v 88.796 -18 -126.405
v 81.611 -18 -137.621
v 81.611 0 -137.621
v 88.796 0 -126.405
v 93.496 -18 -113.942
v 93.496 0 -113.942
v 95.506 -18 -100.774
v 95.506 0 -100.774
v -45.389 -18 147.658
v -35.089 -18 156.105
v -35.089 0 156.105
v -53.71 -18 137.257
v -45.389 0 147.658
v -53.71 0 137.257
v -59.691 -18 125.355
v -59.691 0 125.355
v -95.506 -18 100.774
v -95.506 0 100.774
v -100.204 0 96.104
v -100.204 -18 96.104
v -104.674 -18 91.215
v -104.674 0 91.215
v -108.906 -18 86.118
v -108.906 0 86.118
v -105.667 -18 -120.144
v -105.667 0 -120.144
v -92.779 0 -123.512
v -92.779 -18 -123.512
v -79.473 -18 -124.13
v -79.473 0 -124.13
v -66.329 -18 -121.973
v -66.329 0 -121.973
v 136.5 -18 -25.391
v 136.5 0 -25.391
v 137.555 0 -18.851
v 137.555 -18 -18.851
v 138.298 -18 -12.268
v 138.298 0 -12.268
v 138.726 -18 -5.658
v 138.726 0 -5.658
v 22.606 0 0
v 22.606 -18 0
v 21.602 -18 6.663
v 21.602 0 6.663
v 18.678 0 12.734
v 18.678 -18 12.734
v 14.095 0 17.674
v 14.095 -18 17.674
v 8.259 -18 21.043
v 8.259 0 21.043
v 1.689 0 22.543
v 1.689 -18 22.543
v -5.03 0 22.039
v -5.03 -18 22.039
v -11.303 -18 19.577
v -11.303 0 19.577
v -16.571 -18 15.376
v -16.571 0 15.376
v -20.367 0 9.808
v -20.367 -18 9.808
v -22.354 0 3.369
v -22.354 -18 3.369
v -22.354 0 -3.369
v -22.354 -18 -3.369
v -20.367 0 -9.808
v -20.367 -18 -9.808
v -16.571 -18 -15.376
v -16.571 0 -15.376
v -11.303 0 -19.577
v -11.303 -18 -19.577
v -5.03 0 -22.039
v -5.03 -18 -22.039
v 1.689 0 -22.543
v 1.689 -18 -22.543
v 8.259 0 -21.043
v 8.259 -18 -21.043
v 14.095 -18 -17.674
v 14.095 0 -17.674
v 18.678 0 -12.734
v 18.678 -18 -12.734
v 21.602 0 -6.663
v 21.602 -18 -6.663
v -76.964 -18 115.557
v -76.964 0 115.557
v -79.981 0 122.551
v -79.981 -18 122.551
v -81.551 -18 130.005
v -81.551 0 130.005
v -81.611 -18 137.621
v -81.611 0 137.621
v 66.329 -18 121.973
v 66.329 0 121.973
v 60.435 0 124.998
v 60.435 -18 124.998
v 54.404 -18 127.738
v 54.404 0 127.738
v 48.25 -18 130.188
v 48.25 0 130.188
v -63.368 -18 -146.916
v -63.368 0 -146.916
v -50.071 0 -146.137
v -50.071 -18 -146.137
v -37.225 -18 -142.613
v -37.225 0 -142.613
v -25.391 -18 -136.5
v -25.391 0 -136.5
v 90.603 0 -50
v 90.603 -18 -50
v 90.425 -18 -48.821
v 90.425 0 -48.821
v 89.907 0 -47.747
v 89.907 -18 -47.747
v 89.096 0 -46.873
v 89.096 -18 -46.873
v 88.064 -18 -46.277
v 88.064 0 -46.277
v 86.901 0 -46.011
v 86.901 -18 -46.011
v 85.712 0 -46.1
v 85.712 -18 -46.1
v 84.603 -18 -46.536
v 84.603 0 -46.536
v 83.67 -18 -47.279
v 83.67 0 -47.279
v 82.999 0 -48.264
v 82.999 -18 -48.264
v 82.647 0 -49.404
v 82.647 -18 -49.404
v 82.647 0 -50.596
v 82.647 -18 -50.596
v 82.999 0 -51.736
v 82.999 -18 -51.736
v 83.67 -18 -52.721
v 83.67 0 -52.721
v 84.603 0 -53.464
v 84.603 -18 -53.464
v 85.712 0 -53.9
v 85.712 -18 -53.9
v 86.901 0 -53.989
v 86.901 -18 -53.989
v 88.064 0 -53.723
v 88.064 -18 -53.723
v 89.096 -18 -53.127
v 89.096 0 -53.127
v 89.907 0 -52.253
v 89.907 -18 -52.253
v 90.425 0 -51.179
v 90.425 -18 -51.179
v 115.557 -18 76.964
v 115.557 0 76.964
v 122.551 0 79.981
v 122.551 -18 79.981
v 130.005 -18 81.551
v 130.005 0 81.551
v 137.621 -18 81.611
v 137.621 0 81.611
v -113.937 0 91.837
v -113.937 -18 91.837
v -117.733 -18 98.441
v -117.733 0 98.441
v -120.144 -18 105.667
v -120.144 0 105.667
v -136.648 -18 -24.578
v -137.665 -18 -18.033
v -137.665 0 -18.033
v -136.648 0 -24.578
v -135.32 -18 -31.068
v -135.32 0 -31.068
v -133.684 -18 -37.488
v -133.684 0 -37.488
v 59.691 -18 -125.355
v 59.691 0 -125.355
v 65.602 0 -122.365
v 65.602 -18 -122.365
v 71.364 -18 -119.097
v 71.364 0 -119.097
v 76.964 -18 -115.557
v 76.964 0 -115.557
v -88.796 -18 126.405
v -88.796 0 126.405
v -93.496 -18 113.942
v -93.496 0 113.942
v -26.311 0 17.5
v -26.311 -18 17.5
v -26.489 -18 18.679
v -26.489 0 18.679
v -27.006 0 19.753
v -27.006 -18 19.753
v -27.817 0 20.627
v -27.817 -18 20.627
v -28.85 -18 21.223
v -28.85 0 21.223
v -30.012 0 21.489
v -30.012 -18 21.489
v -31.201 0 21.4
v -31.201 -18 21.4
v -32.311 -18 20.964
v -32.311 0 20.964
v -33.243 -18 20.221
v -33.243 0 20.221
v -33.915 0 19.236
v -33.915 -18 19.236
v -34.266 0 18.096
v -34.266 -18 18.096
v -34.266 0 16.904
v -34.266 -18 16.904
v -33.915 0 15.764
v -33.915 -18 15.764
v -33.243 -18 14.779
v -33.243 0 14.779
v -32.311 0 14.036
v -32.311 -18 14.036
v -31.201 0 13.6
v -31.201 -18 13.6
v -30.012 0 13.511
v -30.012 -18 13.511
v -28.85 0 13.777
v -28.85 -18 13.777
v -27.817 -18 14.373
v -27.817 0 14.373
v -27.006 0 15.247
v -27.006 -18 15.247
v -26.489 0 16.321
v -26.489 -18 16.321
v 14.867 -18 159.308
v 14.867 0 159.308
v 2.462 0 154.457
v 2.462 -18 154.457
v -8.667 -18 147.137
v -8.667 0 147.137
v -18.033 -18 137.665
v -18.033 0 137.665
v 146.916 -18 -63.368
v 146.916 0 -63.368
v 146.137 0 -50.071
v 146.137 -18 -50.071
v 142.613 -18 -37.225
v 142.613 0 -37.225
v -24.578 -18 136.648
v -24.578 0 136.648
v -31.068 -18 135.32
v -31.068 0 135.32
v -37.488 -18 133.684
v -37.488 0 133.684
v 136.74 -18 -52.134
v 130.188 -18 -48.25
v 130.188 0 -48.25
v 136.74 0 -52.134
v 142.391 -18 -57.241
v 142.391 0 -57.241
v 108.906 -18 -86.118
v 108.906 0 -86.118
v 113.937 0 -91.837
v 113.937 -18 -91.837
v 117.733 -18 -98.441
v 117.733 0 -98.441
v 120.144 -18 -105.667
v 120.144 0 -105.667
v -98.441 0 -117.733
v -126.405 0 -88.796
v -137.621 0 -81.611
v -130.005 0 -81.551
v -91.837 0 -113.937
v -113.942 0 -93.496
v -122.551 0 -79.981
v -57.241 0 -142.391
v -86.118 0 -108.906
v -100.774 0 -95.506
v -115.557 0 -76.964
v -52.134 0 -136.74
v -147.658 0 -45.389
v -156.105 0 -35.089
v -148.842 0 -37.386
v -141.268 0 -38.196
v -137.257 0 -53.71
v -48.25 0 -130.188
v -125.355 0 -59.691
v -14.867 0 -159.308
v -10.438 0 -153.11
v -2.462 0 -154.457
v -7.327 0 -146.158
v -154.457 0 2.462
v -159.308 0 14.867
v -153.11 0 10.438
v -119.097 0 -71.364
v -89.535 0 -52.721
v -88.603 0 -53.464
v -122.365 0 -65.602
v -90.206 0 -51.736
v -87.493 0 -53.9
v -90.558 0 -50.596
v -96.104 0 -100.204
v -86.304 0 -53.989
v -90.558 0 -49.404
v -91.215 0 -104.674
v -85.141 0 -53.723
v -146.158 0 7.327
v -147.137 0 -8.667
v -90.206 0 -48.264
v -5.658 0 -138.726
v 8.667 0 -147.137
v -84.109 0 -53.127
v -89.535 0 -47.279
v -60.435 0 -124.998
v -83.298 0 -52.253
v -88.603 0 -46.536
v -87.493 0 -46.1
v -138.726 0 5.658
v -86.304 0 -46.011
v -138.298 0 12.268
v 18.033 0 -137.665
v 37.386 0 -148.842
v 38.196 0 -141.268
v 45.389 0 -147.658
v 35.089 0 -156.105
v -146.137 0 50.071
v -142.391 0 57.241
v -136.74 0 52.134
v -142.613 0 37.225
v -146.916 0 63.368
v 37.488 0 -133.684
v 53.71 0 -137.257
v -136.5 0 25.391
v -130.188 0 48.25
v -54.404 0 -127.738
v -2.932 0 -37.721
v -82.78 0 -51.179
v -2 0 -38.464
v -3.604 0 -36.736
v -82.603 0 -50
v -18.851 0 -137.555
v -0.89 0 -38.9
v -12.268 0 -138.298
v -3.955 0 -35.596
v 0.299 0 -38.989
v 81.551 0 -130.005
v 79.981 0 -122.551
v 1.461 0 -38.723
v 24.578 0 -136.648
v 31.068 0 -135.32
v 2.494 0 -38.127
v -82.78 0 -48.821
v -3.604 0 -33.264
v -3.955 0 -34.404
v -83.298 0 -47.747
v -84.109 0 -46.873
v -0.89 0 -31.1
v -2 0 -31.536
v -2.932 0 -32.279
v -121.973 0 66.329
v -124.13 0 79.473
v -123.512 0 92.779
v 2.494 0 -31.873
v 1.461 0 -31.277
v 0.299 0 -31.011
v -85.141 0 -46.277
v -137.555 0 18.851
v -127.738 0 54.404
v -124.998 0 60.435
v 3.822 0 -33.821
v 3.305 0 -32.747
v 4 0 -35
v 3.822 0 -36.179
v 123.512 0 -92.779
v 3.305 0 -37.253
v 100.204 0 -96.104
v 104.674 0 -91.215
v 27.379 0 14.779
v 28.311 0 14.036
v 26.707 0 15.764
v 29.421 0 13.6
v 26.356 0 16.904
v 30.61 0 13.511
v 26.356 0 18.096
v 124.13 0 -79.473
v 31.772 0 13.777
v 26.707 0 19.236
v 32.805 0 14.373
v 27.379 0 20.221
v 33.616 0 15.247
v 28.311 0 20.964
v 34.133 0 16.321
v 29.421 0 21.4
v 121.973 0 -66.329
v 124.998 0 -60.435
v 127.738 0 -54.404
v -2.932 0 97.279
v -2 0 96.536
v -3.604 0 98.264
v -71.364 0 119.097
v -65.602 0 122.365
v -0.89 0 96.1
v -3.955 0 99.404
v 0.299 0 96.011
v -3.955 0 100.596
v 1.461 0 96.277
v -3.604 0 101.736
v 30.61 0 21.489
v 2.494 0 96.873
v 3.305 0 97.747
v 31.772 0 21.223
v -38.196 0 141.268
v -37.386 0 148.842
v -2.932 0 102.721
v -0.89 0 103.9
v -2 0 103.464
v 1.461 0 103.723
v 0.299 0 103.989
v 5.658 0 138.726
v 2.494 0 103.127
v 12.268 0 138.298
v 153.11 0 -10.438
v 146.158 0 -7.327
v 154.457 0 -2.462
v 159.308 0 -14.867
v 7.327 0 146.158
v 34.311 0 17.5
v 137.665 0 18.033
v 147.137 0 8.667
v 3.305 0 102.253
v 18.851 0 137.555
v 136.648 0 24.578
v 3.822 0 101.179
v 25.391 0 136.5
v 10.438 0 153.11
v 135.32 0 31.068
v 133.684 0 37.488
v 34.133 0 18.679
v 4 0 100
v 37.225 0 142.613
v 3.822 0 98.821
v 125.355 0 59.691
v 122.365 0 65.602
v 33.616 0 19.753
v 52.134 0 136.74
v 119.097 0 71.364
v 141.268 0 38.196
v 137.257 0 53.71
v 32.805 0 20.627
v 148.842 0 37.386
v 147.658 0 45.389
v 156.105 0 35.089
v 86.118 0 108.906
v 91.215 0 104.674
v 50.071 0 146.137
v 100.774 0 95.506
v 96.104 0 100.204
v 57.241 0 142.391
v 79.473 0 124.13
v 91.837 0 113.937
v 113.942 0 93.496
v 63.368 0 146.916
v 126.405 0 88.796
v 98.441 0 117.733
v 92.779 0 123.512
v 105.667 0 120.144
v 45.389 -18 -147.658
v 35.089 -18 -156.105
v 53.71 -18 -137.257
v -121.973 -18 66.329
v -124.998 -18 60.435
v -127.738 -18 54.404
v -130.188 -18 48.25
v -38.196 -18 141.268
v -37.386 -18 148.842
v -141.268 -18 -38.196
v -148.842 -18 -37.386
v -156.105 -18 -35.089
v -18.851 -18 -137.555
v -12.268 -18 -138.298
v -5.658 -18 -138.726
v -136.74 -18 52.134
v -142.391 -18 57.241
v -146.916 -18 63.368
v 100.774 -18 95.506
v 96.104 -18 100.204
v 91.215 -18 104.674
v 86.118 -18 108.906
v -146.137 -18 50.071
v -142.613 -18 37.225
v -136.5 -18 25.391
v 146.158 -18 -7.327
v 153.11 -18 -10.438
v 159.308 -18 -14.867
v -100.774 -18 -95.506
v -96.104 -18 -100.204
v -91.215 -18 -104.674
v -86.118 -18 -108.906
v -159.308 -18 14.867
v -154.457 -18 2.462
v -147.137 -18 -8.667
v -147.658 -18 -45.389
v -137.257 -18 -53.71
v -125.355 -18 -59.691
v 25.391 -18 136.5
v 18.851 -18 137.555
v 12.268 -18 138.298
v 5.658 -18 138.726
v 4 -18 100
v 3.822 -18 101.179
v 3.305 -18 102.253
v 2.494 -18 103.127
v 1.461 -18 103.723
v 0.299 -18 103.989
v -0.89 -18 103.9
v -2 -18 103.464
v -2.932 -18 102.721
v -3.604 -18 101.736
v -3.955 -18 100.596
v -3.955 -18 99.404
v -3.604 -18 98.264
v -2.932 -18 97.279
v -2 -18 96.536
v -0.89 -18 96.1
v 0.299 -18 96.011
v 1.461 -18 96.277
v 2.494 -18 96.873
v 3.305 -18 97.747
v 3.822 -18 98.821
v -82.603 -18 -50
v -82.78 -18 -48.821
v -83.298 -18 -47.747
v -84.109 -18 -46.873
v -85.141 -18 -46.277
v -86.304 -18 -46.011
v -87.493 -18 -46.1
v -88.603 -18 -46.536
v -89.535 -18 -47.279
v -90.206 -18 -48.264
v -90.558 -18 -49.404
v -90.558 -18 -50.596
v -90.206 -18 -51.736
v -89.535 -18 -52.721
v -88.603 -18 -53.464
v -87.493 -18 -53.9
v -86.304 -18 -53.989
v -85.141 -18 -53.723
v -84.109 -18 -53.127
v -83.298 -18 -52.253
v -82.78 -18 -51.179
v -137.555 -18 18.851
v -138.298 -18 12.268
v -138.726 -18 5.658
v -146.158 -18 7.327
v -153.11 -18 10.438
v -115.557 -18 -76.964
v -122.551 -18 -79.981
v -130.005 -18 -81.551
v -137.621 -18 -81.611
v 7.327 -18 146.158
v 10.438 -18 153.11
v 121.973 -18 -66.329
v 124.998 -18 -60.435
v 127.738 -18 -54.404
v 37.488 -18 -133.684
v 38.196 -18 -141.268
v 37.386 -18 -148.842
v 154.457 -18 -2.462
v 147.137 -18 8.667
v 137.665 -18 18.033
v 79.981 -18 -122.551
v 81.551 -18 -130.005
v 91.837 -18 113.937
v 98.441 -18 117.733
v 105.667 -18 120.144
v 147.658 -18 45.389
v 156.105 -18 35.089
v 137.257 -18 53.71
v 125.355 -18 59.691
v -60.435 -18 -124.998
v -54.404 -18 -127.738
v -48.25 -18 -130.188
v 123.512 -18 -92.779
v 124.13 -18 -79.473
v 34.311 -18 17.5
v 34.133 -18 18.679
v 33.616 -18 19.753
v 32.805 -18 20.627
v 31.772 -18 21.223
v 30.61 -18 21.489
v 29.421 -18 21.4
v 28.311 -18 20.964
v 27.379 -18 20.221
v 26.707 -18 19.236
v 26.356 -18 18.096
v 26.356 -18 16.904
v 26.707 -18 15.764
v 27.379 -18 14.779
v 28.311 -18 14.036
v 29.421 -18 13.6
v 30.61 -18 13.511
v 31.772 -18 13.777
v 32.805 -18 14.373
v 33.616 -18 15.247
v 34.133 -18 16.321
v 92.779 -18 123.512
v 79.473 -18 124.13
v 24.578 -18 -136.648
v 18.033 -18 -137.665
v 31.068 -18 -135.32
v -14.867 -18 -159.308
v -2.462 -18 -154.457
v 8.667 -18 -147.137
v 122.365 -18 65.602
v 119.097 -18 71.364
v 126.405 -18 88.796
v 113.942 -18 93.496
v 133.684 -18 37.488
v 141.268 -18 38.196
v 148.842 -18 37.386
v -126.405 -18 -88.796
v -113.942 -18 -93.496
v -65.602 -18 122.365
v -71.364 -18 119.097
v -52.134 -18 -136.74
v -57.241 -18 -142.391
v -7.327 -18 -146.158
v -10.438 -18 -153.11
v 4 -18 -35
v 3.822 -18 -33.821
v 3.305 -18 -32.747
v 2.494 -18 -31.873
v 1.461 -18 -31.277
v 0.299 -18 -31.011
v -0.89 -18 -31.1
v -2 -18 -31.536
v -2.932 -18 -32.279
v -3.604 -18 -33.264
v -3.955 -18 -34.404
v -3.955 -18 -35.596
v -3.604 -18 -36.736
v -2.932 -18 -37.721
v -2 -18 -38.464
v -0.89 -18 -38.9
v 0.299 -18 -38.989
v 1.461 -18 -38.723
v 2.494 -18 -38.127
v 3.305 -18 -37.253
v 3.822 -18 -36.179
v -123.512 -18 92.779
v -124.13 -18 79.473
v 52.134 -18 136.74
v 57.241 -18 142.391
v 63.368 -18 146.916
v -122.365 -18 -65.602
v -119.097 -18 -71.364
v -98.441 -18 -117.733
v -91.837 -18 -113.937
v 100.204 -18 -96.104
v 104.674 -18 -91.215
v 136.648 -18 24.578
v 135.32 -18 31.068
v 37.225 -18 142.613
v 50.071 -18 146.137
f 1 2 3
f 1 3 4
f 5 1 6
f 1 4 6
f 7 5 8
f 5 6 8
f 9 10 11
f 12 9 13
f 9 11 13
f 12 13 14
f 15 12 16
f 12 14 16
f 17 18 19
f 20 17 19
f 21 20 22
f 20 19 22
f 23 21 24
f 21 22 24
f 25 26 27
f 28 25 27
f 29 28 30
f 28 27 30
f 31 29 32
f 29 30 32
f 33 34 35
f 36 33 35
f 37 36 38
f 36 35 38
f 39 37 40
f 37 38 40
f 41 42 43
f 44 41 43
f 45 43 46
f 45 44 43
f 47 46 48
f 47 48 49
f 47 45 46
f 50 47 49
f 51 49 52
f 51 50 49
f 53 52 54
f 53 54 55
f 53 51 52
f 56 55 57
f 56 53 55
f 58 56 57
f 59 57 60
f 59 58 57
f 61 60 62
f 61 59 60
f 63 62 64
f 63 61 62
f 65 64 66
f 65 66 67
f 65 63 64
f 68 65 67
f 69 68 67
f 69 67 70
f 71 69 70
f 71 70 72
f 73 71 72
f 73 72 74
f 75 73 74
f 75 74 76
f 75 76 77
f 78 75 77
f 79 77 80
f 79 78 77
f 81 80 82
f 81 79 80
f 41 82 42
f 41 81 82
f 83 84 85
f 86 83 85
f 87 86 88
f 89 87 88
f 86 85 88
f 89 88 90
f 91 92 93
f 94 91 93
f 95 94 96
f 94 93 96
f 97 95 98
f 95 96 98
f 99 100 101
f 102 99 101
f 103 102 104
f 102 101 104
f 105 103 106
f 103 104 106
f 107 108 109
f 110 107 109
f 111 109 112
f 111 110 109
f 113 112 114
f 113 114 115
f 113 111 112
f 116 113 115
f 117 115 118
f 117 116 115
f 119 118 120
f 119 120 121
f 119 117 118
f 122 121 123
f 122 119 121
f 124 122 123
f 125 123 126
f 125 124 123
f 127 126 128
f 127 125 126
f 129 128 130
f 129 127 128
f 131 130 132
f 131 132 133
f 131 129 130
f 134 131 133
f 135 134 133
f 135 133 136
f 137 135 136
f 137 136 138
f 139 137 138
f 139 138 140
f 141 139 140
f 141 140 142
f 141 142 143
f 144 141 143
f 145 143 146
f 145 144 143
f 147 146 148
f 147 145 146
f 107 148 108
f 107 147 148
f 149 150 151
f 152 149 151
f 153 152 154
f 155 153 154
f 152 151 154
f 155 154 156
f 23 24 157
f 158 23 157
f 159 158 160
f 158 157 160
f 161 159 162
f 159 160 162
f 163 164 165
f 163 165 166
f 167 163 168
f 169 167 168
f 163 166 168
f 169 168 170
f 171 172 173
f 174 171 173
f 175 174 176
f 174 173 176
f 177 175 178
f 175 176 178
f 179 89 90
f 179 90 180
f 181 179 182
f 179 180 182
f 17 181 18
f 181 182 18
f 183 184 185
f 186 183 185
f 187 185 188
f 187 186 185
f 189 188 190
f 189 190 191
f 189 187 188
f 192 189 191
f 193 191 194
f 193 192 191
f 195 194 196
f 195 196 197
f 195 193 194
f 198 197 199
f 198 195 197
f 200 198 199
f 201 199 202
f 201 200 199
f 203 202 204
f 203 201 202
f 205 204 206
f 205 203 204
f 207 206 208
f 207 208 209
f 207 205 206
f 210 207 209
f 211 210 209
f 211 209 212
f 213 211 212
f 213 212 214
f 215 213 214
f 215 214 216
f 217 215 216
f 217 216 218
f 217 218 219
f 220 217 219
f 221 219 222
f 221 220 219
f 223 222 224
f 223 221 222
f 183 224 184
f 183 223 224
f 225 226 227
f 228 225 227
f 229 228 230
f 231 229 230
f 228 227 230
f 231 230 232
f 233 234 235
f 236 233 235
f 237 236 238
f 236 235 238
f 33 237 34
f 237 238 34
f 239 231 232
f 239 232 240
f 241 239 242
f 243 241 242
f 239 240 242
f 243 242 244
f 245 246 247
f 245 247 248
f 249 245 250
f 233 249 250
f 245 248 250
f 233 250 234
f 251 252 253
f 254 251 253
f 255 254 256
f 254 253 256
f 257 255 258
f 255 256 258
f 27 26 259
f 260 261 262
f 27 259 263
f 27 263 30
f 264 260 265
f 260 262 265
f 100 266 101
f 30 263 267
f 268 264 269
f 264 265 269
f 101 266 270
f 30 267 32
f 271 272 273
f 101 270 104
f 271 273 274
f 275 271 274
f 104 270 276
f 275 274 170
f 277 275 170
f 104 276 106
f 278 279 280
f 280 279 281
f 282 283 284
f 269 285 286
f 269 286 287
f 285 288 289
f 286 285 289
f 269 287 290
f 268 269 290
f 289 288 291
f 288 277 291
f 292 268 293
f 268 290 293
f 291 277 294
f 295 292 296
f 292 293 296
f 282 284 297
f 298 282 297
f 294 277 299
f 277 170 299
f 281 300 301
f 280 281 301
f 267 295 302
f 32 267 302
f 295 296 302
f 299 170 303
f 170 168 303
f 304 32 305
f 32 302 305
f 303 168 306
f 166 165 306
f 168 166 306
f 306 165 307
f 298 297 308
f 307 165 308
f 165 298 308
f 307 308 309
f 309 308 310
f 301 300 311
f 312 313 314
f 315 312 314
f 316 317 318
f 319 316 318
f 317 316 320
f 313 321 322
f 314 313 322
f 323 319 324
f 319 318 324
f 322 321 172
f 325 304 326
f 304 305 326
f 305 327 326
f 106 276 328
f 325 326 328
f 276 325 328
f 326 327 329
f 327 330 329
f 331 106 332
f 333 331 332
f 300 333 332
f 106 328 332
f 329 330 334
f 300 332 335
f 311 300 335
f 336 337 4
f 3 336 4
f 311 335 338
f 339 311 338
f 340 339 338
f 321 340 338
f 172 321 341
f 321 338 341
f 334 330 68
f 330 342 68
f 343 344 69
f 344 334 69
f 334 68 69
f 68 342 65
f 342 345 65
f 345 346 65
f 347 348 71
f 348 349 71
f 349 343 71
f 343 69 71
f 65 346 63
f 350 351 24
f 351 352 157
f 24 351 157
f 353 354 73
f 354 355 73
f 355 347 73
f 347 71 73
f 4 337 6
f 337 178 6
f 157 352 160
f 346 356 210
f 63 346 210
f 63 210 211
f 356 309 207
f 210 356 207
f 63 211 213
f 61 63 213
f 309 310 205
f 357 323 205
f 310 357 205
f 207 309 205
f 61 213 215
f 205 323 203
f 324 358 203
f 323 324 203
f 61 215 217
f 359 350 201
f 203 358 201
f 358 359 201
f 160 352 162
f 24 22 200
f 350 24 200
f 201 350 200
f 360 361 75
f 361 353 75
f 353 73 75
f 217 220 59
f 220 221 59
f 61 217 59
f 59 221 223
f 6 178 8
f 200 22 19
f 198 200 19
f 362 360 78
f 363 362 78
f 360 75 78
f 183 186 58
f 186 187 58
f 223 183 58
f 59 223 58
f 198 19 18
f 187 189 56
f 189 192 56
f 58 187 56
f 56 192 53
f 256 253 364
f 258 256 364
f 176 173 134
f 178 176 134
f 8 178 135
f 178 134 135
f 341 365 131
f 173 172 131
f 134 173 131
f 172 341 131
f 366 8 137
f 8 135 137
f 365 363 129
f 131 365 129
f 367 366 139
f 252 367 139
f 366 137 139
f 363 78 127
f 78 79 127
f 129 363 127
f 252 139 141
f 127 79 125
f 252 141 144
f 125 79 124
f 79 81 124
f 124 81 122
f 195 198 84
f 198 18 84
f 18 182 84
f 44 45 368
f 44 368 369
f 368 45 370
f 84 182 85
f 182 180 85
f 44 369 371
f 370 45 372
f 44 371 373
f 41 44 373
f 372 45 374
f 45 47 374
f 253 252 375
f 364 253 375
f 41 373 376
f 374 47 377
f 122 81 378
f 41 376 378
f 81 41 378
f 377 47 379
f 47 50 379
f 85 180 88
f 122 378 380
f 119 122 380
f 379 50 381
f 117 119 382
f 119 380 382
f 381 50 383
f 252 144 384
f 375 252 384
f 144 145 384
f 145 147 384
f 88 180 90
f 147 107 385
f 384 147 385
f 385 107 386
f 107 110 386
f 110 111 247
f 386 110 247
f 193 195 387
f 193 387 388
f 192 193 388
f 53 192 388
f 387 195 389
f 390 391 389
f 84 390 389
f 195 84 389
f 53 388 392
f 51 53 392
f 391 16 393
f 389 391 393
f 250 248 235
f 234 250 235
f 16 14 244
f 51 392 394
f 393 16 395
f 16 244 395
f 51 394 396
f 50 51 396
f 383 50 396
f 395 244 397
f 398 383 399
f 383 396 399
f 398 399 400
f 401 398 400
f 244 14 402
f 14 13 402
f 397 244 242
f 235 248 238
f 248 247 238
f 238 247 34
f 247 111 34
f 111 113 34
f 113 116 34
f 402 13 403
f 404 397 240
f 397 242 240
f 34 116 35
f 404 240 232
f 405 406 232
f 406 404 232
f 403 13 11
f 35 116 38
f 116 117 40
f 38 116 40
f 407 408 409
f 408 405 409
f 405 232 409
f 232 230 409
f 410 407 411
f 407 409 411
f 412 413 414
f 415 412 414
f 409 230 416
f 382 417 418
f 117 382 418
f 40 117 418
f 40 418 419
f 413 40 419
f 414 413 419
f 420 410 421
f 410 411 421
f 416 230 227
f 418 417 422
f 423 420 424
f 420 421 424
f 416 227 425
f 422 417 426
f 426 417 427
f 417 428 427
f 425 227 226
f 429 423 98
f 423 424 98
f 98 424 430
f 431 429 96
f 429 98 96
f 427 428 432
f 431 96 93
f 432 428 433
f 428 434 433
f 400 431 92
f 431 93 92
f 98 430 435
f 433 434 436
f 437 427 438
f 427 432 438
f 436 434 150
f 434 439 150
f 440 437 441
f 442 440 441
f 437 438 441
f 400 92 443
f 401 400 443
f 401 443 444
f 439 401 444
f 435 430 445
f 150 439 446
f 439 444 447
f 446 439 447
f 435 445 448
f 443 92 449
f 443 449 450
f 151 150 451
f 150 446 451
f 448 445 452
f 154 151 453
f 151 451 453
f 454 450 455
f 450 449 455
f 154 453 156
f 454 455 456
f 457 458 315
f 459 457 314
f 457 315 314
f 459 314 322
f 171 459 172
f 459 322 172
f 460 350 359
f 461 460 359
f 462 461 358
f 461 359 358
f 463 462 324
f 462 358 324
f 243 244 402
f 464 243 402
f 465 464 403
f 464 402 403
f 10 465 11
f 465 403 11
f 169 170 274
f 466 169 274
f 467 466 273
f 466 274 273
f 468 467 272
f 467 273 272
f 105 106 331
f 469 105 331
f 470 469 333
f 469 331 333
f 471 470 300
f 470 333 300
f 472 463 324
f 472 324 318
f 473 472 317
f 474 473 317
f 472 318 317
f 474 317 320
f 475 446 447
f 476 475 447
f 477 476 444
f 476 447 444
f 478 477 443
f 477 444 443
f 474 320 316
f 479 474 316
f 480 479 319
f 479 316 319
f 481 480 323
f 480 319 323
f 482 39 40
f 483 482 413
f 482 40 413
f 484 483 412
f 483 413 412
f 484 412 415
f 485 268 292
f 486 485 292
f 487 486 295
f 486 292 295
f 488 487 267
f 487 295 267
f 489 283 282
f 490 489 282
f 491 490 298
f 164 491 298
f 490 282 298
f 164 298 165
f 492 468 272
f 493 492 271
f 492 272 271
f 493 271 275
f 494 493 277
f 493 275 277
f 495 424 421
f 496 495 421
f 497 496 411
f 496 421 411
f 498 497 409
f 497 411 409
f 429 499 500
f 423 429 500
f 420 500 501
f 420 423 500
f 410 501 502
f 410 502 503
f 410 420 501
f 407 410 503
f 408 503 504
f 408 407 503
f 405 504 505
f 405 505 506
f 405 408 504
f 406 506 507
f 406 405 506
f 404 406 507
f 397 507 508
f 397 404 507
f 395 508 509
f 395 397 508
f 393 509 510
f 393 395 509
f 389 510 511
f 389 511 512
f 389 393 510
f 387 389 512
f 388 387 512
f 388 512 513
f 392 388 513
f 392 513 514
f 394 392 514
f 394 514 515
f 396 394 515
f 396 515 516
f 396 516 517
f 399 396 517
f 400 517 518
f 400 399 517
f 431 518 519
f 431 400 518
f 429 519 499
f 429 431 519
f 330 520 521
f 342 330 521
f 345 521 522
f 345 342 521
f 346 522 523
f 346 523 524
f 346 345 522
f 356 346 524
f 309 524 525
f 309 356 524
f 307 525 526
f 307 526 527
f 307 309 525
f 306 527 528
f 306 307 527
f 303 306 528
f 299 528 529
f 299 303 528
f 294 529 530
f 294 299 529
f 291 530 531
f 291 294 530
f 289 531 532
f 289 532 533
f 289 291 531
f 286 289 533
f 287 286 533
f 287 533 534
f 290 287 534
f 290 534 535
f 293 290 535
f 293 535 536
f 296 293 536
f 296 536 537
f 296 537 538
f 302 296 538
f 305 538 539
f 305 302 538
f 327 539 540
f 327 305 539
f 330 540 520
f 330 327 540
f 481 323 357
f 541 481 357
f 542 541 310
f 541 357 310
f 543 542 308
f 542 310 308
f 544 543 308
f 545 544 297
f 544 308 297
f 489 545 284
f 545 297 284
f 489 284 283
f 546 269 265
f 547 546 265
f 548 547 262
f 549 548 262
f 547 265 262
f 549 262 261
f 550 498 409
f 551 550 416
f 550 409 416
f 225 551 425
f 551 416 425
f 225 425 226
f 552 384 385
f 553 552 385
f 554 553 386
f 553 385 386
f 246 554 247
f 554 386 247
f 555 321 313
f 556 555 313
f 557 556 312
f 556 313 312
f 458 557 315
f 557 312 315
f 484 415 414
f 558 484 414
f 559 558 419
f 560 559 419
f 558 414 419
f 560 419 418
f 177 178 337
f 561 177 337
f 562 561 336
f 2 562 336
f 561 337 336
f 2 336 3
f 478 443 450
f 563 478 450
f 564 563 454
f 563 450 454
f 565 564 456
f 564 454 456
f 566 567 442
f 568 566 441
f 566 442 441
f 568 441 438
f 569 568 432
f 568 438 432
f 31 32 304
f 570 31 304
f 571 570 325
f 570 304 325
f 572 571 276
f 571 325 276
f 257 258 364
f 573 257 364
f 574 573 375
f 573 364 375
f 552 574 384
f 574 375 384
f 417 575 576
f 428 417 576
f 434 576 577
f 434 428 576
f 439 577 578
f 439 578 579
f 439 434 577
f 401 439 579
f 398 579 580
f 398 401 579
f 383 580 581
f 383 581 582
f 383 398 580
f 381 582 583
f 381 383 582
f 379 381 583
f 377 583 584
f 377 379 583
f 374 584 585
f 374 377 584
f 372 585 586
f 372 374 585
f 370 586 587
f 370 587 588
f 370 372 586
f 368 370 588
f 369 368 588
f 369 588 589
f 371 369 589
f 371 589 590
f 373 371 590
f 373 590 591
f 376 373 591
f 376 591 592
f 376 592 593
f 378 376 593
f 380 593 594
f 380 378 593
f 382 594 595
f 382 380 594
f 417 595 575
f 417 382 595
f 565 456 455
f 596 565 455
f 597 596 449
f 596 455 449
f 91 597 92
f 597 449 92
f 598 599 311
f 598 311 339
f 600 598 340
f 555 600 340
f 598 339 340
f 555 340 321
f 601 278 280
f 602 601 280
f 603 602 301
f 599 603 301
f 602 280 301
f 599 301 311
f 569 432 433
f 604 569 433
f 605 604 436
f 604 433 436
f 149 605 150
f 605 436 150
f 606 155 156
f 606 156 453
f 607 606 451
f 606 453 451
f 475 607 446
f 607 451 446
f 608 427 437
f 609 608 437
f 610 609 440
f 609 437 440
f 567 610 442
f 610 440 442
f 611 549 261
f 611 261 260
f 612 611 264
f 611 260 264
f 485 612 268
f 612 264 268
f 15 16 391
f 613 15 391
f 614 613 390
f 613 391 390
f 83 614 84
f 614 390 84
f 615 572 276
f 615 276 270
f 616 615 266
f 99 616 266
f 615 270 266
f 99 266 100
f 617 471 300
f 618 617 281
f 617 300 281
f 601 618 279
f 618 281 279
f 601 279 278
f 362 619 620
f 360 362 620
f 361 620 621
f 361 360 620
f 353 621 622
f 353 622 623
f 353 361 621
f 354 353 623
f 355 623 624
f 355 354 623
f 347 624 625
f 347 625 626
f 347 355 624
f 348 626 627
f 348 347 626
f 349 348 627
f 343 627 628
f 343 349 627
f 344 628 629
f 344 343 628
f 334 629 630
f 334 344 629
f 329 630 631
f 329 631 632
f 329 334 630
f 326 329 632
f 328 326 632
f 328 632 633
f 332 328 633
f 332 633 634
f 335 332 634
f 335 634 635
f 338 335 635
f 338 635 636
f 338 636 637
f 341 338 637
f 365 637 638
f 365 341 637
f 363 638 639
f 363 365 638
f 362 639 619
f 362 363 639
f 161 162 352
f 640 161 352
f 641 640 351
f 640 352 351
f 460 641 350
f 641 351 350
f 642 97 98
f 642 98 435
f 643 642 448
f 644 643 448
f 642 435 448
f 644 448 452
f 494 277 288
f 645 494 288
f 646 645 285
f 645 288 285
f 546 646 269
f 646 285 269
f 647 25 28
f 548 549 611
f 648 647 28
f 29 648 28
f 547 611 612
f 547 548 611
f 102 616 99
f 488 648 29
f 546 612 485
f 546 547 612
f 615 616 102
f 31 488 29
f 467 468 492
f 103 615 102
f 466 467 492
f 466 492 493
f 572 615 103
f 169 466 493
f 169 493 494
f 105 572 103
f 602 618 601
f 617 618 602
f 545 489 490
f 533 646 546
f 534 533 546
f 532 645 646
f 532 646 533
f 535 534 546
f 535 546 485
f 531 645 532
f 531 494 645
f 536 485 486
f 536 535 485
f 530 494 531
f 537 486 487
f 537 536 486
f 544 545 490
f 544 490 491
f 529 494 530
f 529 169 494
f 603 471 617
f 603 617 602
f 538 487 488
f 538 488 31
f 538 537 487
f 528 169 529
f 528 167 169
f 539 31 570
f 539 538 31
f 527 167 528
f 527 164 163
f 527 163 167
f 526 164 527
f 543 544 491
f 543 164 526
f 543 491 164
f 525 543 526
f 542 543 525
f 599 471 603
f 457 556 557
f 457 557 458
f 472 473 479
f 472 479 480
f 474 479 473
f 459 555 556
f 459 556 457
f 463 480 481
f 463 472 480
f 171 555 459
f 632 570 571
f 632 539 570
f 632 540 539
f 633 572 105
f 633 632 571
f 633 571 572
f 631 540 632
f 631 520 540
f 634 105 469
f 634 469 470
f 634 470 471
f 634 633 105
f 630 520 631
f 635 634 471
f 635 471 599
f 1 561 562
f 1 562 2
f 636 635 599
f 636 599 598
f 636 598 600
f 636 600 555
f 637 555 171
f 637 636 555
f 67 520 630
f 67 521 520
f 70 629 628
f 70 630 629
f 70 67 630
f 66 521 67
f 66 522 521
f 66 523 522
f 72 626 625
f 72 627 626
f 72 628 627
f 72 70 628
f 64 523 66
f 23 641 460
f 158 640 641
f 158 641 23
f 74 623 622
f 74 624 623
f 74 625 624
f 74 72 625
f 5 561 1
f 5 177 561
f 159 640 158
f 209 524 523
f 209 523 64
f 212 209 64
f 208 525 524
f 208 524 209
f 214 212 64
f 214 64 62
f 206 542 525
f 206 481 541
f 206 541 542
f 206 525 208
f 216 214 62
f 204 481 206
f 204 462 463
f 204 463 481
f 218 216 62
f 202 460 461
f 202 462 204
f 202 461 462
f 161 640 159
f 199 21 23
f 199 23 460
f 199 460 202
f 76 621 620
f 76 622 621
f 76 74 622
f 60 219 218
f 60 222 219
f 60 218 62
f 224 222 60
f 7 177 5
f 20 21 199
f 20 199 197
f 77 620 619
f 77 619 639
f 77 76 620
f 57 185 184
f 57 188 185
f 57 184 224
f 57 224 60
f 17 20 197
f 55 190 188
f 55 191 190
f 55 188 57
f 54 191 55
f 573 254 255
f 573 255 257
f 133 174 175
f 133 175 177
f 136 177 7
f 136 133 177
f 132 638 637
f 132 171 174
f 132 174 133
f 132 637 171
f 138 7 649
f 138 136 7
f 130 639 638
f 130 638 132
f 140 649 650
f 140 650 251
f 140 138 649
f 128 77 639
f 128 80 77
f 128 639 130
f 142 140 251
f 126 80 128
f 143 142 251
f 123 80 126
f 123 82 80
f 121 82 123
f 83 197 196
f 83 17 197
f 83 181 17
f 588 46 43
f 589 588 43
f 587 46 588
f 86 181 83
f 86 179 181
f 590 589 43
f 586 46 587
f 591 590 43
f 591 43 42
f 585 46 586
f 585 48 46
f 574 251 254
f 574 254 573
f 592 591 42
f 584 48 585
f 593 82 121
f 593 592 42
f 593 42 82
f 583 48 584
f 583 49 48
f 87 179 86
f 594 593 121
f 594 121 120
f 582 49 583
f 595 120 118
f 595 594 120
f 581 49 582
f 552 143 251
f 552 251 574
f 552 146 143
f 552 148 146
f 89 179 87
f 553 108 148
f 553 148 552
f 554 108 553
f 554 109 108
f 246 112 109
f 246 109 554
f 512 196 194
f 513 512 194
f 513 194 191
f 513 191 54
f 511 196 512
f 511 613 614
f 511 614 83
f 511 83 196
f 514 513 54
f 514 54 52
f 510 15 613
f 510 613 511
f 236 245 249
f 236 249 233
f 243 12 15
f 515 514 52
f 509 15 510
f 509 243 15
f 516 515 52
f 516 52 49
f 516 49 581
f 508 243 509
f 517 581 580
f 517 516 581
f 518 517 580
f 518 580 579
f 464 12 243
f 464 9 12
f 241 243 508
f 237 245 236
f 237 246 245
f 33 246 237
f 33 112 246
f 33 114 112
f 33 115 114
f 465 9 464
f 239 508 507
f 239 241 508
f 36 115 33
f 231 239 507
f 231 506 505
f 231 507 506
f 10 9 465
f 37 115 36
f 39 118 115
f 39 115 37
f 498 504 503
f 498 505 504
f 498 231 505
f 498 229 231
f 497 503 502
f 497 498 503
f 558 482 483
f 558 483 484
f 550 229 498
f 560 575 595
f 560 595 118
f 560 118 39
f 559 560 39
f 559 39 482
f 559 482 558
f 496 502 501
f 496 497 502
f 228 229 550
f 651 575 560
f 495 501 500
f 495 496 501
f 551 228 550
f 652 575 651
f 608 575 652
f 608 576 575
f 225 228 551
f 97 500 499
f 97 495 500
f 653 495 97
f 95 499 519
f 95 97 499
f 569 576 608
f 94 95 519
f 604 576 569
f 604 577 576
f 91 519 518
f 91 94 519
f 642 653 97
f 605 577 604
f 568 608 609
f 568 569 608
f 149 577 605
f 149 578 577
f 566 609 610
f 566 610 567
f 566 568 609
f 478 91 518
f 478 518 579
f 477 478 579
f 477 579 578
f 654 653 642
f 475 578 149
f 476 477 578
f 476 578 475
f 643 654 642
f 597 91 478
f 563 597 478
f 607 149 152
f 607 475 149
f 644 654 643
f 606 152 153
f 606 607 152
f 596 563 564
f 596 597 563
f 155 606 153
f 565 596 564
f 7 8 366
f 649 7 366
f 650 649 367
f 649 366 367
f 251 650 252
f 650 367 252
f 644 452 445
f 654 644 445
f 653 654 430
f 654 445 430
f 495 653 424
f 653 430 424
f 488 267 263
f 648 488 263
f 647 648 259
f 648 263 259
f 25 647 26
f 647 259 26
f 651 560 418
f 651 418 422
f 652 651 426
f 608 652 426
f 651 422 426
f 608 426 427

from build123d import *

# Parameters (mm, degrees)
F0_R     = 4
F0_R_2   = 22.606
F1_DEPTH = 18


with BuildPart() as f1:
    # F0 (on Front) → F1 (new body)
    with BuildSketch(Plane.XZ):
        with BuildLine():
            ThreePointArc((138.72574, -5.657885), (138.812234, -2.82953), (138.841069, 0))
            ThreePointArc((138.841069, 0), (138.546757, 9.035416), (137.665067, 18.032525))
            ThreePointArc((137.665067, 18.032525), (136.023008, 27.831344), (133.684401, 37.487643))
            ThreePointArc((133.684401, 37.487643), (129.994558, 48.76738), (125.354902, 59.690796))
            ThreePointArc((125.354902, 59.690796), (120.76521, 68.502602), (115.557102, 76.963619))
            ThreePointArc((115.557102, 76.963619), (108.562222, 86.551062), (100.774126, 95.506115))
            ThreePointArc((100.774126, 95.506115), (93.686072, 102.468348), (86.118269, 108.90586))
            ThreePointArc((86.118269, 108.90586), (76.50306, 115.862524), (66.328876, 121.972631))
            ThreePointArc((66.328876, 121.972631), (57.436288, 126.403779), (48.249579, 130.187636))
            ThreePointArc((48.249579, 130.187636), (36.955245, 133.832554), (25.390894, 136.499615))
            ThreePointArc((25.390894, 136.499615), (15.56424, 137.965927), (5.657885, 138.72574))
            ThreePointArc((5.657885, 138.72574), (-6.210007, 138.702121), (-18.032525, 137.665067))
            ThreePointArc((-18.032525, 137.665067), (-27.831344, 136.023008), (-37.487643, 133.684401))
            ThreePointArc((-37.487643, 133.684401), (-48.76738, 129.994558), (-59.690796, 125.354902))
            ThreePointArc((-59.690796, 125.354902), (-68.502602, 120.76521), (-76.963619, 115.557102))
            ThreePointArc((-76.963619, 115.557102), (-86.551062, 108.562222), (-95.506115, 100.774126))
            ThreePointArc((-95.506115, 100.774126), (-102.468348, 93.686072), (-108.90586, 86.118269))
            ThreePointArc((-108.90586, 86.118269), (-115.862524, 76.50306), (-121.972631, 66.328876))
            ThreePointArc((-121.972631, 66.328876), (-126.403779, 57.436288), (-130.187636, 48.249579))
            ThreePointArc((-130.187636, 48.249579), (-133.832554, 36.955245), (-136.499615, 25.390894))
            ThreePointArc((-136.499615, 25.390894), (-137.965927, 15.56424), (-138.72574, 5.657885))
            ThreePointArc((-138.72574, 5.657885), (-138.702121, -6.210007), (-137.665067, -18.032525))
            ThreePointArc((-137.665067, -18.032525), (-136.023008, -27.831344), (-133.684401, -37.487643))
            ThreePointArc((-133.684401, -37.487643), (-129.994558, -48.76738), (-125.354902, -59.690796))
            ThreePointArc((-125.354902, -59.690796), (-120.76521, -68.502602), (-115.557102, -76.963619))
            ThreePointArc((-115.557102, -76.963619), (-108.562222, -86.551062), (-100.774126, -95.506115))
            ThreePointArc((-100.774126, -95.506115), (-93.686072, -102.468348), (-86.118269, -108.90586))
            ThreePointArc((-86.118269, -108.90586), (-76.50306, -115.862524), (-66.328876, -121.972631))
            ThreePointArc((-66.328876, -121.972631), (-57.436288, -126.403779), (-48.249579, -130.187636))
            ThreePointArc((-48.249579, -130.187636), (-36.955245, -133.832554), (-25.390894, -136.499615))
            ThreePointArc((-25.390894, -136.499615), (-15.56424, -137.965927), (-5.657885, -138.72574))
            ThreePointArc((-5.657885, -138.72574), (6.210007, -138.702121), (18.032525, -137.665067))
            ThreePointArc((18.032525, -137.665067), (27.831344, -136.023008), (37.487643, -133.684401))
            ThreePointArc((37.487643, -133.684401), (48.76738, -129.994558), (59.690796, -125.354902))
            ThreePointArc((59.690796, -125.354902), (68.502602, -120.76521), (76.963619, -115.557102))
            ThreePointArc((76.963619, -115.557102), (86.551062, -108.562222), (95.506115, -100.774126))
            ThreePointArc((95.506115, -100.774126), (102.468348, -93.686072), (108.90586, -86.118269))
            ThreePointArc((108.90586, -86.118269), (115.862524, -76.50306), (121.972631, -66.328876))
            ThreePointArc((121.972631, -66.328876), (126.403779, -57.436288), (130.187636, -48.249579))
            ThreePointArc((130.187636, -48.249579), (133.832554, -36.955245), (136.499615, -25.390894))
            ThreePointArc((136.499615, -25.390894), (137.965927, -15.56424), (138.72574, -5.657885))
        make_face()
        with Locations((-86.60254, -50)):
            Circle(F0_R, mode=Mode.SUBTRACT)
        with Locations((0, -35)):
            Circle(F0_R, mode=Mode.SUBTRACT)
        with Locations((86.60254, -50)):
            Circle(F0_R, mode=Mode.SUBTRACT)
        with Locations((-30.310889, 17.5)):
            Circle(F0_R, mode=Mode.SUBTRACT)
        Circle(F0_R_2, mode=Mode.SUBTRACT)
        with Locations((30.310889, 17.5)):
            Circle(F0_R, mode=Mode.SUBTRACT)
        with Locations((0, 100)):
            Circle(F0_R, mode=Mode.SUBTRACT)
        with BuildLine():
            ThreePointArc((-137.665067, -18.032525), (-138.702121, -6.210007), (-138.72574, 5.657885))
            ThreePointArc((-138.72574, 5.657885), (-149.711791, 8.709228), (-159.307768, 14.867253))
            ThreePointArc((-159.307768, 14.867253), (-151.088132, -3.294142), (-137.665067, -18.032525))
        make_face()
        with BuildLine():
            ThreePointArc((-136.499615, 25.390894), (-133.832554, 36.955245), (-130.187636, 48.249579))
            ThreePointArc((-130.187636, 48.249579), (-139.693075, 54.546456), (-146.916457, 63.368405))
            ThreePointArc((-146.916457, 63.368405), (-144.711299, 43.555885), (-136.499615, 25.390894))
        make_face()
        with BuildLine():
            ThreePointArc((-121.972631, 66.328876), (-115.862524, 76.50306), (-108.90586, 86.118269))
            ThreePointArc((-108.90586, 86.118269), (-116.000227, 95.044297), (-120.14394, 105.666616))
            ThreePointArc((-120.14394, 105.666616), (-124.169115, 86.142359), (-121.972631, 66.328876))
        make_face()
        with BuildLine():
            ThreePointArc((-95.506115, 100.774126), (-86.551062, 108.562222), (-76.963619, 115.557102))
            ThreePointArc((-76.963619, 115.557102), (-80.952469, 126.238539), (-81.610896, 137.621443))
            ThreePointArc((-81.610896, 137.621443), (-91.472393, 120.296619), (-95.506115, 100.774126))
        make_face()
        with BuildLine():
            ThreePointArc((-59.690796, 125.354902), (-48.76738, 129.994558), (-37.487643, 133.684401))
            ThreePointArc((-37.487643, 133.684401), (-37.980519, 145.075674), (-35.08921, 156.104924))
            ThreePointArc((-35.08921, 156.104924), (-49.821716, 142.675407), (-59.690796, 125.354902))
        make_face()
        with BuildLine():
            ThreePointArc((-18.032525, 137.665067), (-6.210007, 138.702121), (5.657885, 138.72574))
            ThreePointArc((5.657885, 138.72574), (8.709228, 149.711791), (14.867253, 159.307768))
            ThreePointArc((14.867253, 159.307768), (-3.294142, 151.088132), (-18.032525, 137.665067))
        make_face()
        with BuildLine():
            ThreePointArc((25.390894, 136.499615), (36.955245, 133.832554), (48.249579, 130.187636))
            ThreePointArc((48.249579, 130.187636), (54.546456, 139.693075), (63.368405, 146.916457))
            ThreePointArc((63.368405, 146.916457), (43.555885, 144.711299), (25.390894, 136.499615))
        make_face()
        with BuildLine():
            ThreePointArc((66.328876, 121.972631), (76.50306, 115.862524), (86.118269, 108.90586))
            ThreePointArc((86.118269, 108.90586), (95.044297, 116.000227), (105.666616, 120.14394))
            ThreePointArc((105.666616, 120.14394), (86.142359, 124.169115), (66.328876, 121.972631))
        make_face()
        with BuildLine():
            ThreePointArc((100.774126, 95.506115), (108.562222, 86.551062), (115.557102, 76.963619))
            ThreePointArc((115.557102, 76.963619), (126.238539, 80.952469), (137.621443, 81.610896))
            ThreePointArc((137.621443, 81.610896), (120.296619, 91.472393), (100.774126, 95.506115))
        make_face()
        with BuildLine():
            ThreePointArc((125.354902, 59.690796), (129.994558, 48.76738), (133.684401, 37.487643))
            ThreePointArc((133.684401, 37.487643), (145.075674, 37.980519), (156.104924, 35.08921))
            ThreePointArc((156.104924, 35.08921), (142.675407, 49.821716), (125.354902, 59.690796))
        make_face()
        with BuildLine():
            ThreePointArc((137.665067, 18.032525), (138.546757, 9.035416), (138.841069, 0))
            ThreePointArc((138.841069, 0), (138.812234, -2.82953), (138.72574, -5.657885))
            ThreePointArc((138.72574, -5.657885), (149.711791, -8.709228), (159.307768, -14.867253))
            ThreePointArc((159.307768, -14.867253), (151.088132, 3.294142), (137.665067, 18.032525))
        make_face()
        with BuildLine():
            ThreePointArc((146.916457, -63.368405), (144.711299, -43.555885), (136.499615, -25.390894))
            ThreePointArc((136.499615, -25.390894), (133.832554, -36.955245), (130.187636, -48.249579))
            ThreePointArc((130.187636, -48.249579), (139.693075, -54.546456), (146.916457, -63.368405))
        make_face()
        with BuildLine():
            ThreePointArc((120.14394, -105.666616), (124.169115, -86.142359), (121.972631, -66.328876))
            ThreePointArc((121.972631, -66.328876), (115.862524, -76.50306), (108.90586, -86.118269))
            ThreePointArc((108.90586, -86.118269), (116.000227, -95.044297), (120.14394, -105.666616))
        make_face()
        with BuildLine():
            ThreePointArc((81.610896, -137.621443), (91.472393, -120.296619), (95.506115, -100.774126))
            ThreePointArc((95.506115, -100.774126), (86.551062, -108.562222), (76.963619, -115.557102))
            ThreePointArc((76.963619, -115.557102), (80.952469, -126.238539), (81.610896, -137.621443))
        make_face()
        with BuildLine():
            ThreePointArc((35.08921, -156.104924), (49.821716, -142.675407), (59.690796, -125.354902))
            ThreePointArc((59.690796, -125.354902), (48.76738, -129.994558), (37.487643, -133.684401))
            ThreePointArc((37.487643, -133.684401), (37.980519, -145.075674), (35.08921, -156.104924))
        make_face()
        with BuildLine():
            ThreePointArc((-14.867253, -159.307768), (3.294142, -151.088132), (18.032525, -137.665067))
            ThreePointArc((18.032525, -137.665067), (6.210007, -138.702121), (-5.657885, -138.72574))
            ThreePointArc((-5.657885, -138.72574), (-8.709228, -149.711791), (-14.867253, -159.307768))
        make_face()
        with BuildLine():
            ThreePointArc((-63.368405, -146.916457), (-43.555885, -144.711299), (-25.390894, -136.499615))
            ThreePointArc((-25.390894, -136.499615), (-36.955245, -133.832554), (-48.249579, -130.187636))
            ThreePointArc((-48.249579, -130.187636), (-54.546456, -139.693075), (-63.368405, -146.916457))
        make_face()
        with BuildLine():
            ThreePointArc((-105.666616, -120.14394), (-86.142359, -124.169115), (-66.328876, -121.972631))
            ThreePointArc((-66.328876, -121.972631), (-76.50306, -115.862524), (-86.118269, -108.90586))
            ThreePointArc((-86.118269, -108.90586), (-95.044297, -116.000227), (-105.666616, -120.14394))
        make_face()
        with BuildLine():
            ThreePointArc((-137.621443, -81.610896), (-120.296619, -91.472393), (-100.774126, -95.506115))
            ThreePointArc((-100.774126, -95.506115), (-108.562222, -86.551062), (-115.557102, -76.963619))
            ThreePointArc((-115.557102, -76.963619), (-126.238539, -80.952469), (-137.621443, -81.610896))
        make_face()
        with BuildLine():
            ThreePointArc((-156.104924, -35.08921), (-142.675407, -49.821716), (-125.354902, -59.690796))
            ThreePointArc((-125.354902, -59.690796), (-129.994558, -48.76738), (-133.684401, -37.487643))
            ThreePointArc((-133.684401, -37.487643), (-145.075674, -37.980519), (-156.104924, -35.08921))
        make_face()
    extrude(amount=F1_DEPTH)


solid = f1.part
